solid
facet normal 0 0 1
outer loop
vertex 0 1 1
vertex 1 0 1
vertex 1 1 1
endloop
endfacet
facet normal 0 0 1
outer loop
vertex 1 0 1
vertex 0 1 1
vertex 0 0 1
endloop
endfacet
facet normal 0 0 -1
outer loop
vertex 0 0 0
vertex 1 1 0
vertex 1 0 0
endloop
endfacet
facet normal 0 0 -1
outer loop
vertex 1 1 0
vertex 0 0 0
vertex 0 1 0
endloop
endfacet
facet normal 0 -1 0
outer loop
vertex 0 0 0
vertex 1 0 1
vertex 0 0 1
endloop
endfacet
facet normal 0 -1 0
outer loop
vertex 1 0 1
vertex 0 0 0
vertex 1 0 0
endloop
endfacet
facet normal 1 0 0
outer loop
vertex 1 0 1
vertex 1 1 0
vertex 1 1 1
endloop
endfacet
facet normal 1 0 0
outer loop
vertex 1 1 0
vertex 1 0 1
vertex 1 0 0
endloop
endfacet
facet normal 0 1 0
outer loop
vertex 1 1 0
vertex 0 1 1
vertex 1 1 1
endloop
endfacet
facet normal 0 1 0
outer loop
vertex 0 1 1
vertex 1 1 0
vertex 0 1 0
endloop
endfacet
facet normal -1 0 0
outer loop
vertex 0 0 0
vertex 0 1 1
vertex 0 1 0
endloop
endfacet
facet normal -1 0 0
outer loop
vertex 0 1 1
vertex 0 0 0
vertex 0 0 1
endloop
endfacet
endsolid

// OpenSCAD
//
// Attached to the first statement, not a doc.

/* [Parameters] */
// Attached to the first statement, not a doc.
x = 1;

/* [Hidden] */

// onescad: main.scad

cube(x);
